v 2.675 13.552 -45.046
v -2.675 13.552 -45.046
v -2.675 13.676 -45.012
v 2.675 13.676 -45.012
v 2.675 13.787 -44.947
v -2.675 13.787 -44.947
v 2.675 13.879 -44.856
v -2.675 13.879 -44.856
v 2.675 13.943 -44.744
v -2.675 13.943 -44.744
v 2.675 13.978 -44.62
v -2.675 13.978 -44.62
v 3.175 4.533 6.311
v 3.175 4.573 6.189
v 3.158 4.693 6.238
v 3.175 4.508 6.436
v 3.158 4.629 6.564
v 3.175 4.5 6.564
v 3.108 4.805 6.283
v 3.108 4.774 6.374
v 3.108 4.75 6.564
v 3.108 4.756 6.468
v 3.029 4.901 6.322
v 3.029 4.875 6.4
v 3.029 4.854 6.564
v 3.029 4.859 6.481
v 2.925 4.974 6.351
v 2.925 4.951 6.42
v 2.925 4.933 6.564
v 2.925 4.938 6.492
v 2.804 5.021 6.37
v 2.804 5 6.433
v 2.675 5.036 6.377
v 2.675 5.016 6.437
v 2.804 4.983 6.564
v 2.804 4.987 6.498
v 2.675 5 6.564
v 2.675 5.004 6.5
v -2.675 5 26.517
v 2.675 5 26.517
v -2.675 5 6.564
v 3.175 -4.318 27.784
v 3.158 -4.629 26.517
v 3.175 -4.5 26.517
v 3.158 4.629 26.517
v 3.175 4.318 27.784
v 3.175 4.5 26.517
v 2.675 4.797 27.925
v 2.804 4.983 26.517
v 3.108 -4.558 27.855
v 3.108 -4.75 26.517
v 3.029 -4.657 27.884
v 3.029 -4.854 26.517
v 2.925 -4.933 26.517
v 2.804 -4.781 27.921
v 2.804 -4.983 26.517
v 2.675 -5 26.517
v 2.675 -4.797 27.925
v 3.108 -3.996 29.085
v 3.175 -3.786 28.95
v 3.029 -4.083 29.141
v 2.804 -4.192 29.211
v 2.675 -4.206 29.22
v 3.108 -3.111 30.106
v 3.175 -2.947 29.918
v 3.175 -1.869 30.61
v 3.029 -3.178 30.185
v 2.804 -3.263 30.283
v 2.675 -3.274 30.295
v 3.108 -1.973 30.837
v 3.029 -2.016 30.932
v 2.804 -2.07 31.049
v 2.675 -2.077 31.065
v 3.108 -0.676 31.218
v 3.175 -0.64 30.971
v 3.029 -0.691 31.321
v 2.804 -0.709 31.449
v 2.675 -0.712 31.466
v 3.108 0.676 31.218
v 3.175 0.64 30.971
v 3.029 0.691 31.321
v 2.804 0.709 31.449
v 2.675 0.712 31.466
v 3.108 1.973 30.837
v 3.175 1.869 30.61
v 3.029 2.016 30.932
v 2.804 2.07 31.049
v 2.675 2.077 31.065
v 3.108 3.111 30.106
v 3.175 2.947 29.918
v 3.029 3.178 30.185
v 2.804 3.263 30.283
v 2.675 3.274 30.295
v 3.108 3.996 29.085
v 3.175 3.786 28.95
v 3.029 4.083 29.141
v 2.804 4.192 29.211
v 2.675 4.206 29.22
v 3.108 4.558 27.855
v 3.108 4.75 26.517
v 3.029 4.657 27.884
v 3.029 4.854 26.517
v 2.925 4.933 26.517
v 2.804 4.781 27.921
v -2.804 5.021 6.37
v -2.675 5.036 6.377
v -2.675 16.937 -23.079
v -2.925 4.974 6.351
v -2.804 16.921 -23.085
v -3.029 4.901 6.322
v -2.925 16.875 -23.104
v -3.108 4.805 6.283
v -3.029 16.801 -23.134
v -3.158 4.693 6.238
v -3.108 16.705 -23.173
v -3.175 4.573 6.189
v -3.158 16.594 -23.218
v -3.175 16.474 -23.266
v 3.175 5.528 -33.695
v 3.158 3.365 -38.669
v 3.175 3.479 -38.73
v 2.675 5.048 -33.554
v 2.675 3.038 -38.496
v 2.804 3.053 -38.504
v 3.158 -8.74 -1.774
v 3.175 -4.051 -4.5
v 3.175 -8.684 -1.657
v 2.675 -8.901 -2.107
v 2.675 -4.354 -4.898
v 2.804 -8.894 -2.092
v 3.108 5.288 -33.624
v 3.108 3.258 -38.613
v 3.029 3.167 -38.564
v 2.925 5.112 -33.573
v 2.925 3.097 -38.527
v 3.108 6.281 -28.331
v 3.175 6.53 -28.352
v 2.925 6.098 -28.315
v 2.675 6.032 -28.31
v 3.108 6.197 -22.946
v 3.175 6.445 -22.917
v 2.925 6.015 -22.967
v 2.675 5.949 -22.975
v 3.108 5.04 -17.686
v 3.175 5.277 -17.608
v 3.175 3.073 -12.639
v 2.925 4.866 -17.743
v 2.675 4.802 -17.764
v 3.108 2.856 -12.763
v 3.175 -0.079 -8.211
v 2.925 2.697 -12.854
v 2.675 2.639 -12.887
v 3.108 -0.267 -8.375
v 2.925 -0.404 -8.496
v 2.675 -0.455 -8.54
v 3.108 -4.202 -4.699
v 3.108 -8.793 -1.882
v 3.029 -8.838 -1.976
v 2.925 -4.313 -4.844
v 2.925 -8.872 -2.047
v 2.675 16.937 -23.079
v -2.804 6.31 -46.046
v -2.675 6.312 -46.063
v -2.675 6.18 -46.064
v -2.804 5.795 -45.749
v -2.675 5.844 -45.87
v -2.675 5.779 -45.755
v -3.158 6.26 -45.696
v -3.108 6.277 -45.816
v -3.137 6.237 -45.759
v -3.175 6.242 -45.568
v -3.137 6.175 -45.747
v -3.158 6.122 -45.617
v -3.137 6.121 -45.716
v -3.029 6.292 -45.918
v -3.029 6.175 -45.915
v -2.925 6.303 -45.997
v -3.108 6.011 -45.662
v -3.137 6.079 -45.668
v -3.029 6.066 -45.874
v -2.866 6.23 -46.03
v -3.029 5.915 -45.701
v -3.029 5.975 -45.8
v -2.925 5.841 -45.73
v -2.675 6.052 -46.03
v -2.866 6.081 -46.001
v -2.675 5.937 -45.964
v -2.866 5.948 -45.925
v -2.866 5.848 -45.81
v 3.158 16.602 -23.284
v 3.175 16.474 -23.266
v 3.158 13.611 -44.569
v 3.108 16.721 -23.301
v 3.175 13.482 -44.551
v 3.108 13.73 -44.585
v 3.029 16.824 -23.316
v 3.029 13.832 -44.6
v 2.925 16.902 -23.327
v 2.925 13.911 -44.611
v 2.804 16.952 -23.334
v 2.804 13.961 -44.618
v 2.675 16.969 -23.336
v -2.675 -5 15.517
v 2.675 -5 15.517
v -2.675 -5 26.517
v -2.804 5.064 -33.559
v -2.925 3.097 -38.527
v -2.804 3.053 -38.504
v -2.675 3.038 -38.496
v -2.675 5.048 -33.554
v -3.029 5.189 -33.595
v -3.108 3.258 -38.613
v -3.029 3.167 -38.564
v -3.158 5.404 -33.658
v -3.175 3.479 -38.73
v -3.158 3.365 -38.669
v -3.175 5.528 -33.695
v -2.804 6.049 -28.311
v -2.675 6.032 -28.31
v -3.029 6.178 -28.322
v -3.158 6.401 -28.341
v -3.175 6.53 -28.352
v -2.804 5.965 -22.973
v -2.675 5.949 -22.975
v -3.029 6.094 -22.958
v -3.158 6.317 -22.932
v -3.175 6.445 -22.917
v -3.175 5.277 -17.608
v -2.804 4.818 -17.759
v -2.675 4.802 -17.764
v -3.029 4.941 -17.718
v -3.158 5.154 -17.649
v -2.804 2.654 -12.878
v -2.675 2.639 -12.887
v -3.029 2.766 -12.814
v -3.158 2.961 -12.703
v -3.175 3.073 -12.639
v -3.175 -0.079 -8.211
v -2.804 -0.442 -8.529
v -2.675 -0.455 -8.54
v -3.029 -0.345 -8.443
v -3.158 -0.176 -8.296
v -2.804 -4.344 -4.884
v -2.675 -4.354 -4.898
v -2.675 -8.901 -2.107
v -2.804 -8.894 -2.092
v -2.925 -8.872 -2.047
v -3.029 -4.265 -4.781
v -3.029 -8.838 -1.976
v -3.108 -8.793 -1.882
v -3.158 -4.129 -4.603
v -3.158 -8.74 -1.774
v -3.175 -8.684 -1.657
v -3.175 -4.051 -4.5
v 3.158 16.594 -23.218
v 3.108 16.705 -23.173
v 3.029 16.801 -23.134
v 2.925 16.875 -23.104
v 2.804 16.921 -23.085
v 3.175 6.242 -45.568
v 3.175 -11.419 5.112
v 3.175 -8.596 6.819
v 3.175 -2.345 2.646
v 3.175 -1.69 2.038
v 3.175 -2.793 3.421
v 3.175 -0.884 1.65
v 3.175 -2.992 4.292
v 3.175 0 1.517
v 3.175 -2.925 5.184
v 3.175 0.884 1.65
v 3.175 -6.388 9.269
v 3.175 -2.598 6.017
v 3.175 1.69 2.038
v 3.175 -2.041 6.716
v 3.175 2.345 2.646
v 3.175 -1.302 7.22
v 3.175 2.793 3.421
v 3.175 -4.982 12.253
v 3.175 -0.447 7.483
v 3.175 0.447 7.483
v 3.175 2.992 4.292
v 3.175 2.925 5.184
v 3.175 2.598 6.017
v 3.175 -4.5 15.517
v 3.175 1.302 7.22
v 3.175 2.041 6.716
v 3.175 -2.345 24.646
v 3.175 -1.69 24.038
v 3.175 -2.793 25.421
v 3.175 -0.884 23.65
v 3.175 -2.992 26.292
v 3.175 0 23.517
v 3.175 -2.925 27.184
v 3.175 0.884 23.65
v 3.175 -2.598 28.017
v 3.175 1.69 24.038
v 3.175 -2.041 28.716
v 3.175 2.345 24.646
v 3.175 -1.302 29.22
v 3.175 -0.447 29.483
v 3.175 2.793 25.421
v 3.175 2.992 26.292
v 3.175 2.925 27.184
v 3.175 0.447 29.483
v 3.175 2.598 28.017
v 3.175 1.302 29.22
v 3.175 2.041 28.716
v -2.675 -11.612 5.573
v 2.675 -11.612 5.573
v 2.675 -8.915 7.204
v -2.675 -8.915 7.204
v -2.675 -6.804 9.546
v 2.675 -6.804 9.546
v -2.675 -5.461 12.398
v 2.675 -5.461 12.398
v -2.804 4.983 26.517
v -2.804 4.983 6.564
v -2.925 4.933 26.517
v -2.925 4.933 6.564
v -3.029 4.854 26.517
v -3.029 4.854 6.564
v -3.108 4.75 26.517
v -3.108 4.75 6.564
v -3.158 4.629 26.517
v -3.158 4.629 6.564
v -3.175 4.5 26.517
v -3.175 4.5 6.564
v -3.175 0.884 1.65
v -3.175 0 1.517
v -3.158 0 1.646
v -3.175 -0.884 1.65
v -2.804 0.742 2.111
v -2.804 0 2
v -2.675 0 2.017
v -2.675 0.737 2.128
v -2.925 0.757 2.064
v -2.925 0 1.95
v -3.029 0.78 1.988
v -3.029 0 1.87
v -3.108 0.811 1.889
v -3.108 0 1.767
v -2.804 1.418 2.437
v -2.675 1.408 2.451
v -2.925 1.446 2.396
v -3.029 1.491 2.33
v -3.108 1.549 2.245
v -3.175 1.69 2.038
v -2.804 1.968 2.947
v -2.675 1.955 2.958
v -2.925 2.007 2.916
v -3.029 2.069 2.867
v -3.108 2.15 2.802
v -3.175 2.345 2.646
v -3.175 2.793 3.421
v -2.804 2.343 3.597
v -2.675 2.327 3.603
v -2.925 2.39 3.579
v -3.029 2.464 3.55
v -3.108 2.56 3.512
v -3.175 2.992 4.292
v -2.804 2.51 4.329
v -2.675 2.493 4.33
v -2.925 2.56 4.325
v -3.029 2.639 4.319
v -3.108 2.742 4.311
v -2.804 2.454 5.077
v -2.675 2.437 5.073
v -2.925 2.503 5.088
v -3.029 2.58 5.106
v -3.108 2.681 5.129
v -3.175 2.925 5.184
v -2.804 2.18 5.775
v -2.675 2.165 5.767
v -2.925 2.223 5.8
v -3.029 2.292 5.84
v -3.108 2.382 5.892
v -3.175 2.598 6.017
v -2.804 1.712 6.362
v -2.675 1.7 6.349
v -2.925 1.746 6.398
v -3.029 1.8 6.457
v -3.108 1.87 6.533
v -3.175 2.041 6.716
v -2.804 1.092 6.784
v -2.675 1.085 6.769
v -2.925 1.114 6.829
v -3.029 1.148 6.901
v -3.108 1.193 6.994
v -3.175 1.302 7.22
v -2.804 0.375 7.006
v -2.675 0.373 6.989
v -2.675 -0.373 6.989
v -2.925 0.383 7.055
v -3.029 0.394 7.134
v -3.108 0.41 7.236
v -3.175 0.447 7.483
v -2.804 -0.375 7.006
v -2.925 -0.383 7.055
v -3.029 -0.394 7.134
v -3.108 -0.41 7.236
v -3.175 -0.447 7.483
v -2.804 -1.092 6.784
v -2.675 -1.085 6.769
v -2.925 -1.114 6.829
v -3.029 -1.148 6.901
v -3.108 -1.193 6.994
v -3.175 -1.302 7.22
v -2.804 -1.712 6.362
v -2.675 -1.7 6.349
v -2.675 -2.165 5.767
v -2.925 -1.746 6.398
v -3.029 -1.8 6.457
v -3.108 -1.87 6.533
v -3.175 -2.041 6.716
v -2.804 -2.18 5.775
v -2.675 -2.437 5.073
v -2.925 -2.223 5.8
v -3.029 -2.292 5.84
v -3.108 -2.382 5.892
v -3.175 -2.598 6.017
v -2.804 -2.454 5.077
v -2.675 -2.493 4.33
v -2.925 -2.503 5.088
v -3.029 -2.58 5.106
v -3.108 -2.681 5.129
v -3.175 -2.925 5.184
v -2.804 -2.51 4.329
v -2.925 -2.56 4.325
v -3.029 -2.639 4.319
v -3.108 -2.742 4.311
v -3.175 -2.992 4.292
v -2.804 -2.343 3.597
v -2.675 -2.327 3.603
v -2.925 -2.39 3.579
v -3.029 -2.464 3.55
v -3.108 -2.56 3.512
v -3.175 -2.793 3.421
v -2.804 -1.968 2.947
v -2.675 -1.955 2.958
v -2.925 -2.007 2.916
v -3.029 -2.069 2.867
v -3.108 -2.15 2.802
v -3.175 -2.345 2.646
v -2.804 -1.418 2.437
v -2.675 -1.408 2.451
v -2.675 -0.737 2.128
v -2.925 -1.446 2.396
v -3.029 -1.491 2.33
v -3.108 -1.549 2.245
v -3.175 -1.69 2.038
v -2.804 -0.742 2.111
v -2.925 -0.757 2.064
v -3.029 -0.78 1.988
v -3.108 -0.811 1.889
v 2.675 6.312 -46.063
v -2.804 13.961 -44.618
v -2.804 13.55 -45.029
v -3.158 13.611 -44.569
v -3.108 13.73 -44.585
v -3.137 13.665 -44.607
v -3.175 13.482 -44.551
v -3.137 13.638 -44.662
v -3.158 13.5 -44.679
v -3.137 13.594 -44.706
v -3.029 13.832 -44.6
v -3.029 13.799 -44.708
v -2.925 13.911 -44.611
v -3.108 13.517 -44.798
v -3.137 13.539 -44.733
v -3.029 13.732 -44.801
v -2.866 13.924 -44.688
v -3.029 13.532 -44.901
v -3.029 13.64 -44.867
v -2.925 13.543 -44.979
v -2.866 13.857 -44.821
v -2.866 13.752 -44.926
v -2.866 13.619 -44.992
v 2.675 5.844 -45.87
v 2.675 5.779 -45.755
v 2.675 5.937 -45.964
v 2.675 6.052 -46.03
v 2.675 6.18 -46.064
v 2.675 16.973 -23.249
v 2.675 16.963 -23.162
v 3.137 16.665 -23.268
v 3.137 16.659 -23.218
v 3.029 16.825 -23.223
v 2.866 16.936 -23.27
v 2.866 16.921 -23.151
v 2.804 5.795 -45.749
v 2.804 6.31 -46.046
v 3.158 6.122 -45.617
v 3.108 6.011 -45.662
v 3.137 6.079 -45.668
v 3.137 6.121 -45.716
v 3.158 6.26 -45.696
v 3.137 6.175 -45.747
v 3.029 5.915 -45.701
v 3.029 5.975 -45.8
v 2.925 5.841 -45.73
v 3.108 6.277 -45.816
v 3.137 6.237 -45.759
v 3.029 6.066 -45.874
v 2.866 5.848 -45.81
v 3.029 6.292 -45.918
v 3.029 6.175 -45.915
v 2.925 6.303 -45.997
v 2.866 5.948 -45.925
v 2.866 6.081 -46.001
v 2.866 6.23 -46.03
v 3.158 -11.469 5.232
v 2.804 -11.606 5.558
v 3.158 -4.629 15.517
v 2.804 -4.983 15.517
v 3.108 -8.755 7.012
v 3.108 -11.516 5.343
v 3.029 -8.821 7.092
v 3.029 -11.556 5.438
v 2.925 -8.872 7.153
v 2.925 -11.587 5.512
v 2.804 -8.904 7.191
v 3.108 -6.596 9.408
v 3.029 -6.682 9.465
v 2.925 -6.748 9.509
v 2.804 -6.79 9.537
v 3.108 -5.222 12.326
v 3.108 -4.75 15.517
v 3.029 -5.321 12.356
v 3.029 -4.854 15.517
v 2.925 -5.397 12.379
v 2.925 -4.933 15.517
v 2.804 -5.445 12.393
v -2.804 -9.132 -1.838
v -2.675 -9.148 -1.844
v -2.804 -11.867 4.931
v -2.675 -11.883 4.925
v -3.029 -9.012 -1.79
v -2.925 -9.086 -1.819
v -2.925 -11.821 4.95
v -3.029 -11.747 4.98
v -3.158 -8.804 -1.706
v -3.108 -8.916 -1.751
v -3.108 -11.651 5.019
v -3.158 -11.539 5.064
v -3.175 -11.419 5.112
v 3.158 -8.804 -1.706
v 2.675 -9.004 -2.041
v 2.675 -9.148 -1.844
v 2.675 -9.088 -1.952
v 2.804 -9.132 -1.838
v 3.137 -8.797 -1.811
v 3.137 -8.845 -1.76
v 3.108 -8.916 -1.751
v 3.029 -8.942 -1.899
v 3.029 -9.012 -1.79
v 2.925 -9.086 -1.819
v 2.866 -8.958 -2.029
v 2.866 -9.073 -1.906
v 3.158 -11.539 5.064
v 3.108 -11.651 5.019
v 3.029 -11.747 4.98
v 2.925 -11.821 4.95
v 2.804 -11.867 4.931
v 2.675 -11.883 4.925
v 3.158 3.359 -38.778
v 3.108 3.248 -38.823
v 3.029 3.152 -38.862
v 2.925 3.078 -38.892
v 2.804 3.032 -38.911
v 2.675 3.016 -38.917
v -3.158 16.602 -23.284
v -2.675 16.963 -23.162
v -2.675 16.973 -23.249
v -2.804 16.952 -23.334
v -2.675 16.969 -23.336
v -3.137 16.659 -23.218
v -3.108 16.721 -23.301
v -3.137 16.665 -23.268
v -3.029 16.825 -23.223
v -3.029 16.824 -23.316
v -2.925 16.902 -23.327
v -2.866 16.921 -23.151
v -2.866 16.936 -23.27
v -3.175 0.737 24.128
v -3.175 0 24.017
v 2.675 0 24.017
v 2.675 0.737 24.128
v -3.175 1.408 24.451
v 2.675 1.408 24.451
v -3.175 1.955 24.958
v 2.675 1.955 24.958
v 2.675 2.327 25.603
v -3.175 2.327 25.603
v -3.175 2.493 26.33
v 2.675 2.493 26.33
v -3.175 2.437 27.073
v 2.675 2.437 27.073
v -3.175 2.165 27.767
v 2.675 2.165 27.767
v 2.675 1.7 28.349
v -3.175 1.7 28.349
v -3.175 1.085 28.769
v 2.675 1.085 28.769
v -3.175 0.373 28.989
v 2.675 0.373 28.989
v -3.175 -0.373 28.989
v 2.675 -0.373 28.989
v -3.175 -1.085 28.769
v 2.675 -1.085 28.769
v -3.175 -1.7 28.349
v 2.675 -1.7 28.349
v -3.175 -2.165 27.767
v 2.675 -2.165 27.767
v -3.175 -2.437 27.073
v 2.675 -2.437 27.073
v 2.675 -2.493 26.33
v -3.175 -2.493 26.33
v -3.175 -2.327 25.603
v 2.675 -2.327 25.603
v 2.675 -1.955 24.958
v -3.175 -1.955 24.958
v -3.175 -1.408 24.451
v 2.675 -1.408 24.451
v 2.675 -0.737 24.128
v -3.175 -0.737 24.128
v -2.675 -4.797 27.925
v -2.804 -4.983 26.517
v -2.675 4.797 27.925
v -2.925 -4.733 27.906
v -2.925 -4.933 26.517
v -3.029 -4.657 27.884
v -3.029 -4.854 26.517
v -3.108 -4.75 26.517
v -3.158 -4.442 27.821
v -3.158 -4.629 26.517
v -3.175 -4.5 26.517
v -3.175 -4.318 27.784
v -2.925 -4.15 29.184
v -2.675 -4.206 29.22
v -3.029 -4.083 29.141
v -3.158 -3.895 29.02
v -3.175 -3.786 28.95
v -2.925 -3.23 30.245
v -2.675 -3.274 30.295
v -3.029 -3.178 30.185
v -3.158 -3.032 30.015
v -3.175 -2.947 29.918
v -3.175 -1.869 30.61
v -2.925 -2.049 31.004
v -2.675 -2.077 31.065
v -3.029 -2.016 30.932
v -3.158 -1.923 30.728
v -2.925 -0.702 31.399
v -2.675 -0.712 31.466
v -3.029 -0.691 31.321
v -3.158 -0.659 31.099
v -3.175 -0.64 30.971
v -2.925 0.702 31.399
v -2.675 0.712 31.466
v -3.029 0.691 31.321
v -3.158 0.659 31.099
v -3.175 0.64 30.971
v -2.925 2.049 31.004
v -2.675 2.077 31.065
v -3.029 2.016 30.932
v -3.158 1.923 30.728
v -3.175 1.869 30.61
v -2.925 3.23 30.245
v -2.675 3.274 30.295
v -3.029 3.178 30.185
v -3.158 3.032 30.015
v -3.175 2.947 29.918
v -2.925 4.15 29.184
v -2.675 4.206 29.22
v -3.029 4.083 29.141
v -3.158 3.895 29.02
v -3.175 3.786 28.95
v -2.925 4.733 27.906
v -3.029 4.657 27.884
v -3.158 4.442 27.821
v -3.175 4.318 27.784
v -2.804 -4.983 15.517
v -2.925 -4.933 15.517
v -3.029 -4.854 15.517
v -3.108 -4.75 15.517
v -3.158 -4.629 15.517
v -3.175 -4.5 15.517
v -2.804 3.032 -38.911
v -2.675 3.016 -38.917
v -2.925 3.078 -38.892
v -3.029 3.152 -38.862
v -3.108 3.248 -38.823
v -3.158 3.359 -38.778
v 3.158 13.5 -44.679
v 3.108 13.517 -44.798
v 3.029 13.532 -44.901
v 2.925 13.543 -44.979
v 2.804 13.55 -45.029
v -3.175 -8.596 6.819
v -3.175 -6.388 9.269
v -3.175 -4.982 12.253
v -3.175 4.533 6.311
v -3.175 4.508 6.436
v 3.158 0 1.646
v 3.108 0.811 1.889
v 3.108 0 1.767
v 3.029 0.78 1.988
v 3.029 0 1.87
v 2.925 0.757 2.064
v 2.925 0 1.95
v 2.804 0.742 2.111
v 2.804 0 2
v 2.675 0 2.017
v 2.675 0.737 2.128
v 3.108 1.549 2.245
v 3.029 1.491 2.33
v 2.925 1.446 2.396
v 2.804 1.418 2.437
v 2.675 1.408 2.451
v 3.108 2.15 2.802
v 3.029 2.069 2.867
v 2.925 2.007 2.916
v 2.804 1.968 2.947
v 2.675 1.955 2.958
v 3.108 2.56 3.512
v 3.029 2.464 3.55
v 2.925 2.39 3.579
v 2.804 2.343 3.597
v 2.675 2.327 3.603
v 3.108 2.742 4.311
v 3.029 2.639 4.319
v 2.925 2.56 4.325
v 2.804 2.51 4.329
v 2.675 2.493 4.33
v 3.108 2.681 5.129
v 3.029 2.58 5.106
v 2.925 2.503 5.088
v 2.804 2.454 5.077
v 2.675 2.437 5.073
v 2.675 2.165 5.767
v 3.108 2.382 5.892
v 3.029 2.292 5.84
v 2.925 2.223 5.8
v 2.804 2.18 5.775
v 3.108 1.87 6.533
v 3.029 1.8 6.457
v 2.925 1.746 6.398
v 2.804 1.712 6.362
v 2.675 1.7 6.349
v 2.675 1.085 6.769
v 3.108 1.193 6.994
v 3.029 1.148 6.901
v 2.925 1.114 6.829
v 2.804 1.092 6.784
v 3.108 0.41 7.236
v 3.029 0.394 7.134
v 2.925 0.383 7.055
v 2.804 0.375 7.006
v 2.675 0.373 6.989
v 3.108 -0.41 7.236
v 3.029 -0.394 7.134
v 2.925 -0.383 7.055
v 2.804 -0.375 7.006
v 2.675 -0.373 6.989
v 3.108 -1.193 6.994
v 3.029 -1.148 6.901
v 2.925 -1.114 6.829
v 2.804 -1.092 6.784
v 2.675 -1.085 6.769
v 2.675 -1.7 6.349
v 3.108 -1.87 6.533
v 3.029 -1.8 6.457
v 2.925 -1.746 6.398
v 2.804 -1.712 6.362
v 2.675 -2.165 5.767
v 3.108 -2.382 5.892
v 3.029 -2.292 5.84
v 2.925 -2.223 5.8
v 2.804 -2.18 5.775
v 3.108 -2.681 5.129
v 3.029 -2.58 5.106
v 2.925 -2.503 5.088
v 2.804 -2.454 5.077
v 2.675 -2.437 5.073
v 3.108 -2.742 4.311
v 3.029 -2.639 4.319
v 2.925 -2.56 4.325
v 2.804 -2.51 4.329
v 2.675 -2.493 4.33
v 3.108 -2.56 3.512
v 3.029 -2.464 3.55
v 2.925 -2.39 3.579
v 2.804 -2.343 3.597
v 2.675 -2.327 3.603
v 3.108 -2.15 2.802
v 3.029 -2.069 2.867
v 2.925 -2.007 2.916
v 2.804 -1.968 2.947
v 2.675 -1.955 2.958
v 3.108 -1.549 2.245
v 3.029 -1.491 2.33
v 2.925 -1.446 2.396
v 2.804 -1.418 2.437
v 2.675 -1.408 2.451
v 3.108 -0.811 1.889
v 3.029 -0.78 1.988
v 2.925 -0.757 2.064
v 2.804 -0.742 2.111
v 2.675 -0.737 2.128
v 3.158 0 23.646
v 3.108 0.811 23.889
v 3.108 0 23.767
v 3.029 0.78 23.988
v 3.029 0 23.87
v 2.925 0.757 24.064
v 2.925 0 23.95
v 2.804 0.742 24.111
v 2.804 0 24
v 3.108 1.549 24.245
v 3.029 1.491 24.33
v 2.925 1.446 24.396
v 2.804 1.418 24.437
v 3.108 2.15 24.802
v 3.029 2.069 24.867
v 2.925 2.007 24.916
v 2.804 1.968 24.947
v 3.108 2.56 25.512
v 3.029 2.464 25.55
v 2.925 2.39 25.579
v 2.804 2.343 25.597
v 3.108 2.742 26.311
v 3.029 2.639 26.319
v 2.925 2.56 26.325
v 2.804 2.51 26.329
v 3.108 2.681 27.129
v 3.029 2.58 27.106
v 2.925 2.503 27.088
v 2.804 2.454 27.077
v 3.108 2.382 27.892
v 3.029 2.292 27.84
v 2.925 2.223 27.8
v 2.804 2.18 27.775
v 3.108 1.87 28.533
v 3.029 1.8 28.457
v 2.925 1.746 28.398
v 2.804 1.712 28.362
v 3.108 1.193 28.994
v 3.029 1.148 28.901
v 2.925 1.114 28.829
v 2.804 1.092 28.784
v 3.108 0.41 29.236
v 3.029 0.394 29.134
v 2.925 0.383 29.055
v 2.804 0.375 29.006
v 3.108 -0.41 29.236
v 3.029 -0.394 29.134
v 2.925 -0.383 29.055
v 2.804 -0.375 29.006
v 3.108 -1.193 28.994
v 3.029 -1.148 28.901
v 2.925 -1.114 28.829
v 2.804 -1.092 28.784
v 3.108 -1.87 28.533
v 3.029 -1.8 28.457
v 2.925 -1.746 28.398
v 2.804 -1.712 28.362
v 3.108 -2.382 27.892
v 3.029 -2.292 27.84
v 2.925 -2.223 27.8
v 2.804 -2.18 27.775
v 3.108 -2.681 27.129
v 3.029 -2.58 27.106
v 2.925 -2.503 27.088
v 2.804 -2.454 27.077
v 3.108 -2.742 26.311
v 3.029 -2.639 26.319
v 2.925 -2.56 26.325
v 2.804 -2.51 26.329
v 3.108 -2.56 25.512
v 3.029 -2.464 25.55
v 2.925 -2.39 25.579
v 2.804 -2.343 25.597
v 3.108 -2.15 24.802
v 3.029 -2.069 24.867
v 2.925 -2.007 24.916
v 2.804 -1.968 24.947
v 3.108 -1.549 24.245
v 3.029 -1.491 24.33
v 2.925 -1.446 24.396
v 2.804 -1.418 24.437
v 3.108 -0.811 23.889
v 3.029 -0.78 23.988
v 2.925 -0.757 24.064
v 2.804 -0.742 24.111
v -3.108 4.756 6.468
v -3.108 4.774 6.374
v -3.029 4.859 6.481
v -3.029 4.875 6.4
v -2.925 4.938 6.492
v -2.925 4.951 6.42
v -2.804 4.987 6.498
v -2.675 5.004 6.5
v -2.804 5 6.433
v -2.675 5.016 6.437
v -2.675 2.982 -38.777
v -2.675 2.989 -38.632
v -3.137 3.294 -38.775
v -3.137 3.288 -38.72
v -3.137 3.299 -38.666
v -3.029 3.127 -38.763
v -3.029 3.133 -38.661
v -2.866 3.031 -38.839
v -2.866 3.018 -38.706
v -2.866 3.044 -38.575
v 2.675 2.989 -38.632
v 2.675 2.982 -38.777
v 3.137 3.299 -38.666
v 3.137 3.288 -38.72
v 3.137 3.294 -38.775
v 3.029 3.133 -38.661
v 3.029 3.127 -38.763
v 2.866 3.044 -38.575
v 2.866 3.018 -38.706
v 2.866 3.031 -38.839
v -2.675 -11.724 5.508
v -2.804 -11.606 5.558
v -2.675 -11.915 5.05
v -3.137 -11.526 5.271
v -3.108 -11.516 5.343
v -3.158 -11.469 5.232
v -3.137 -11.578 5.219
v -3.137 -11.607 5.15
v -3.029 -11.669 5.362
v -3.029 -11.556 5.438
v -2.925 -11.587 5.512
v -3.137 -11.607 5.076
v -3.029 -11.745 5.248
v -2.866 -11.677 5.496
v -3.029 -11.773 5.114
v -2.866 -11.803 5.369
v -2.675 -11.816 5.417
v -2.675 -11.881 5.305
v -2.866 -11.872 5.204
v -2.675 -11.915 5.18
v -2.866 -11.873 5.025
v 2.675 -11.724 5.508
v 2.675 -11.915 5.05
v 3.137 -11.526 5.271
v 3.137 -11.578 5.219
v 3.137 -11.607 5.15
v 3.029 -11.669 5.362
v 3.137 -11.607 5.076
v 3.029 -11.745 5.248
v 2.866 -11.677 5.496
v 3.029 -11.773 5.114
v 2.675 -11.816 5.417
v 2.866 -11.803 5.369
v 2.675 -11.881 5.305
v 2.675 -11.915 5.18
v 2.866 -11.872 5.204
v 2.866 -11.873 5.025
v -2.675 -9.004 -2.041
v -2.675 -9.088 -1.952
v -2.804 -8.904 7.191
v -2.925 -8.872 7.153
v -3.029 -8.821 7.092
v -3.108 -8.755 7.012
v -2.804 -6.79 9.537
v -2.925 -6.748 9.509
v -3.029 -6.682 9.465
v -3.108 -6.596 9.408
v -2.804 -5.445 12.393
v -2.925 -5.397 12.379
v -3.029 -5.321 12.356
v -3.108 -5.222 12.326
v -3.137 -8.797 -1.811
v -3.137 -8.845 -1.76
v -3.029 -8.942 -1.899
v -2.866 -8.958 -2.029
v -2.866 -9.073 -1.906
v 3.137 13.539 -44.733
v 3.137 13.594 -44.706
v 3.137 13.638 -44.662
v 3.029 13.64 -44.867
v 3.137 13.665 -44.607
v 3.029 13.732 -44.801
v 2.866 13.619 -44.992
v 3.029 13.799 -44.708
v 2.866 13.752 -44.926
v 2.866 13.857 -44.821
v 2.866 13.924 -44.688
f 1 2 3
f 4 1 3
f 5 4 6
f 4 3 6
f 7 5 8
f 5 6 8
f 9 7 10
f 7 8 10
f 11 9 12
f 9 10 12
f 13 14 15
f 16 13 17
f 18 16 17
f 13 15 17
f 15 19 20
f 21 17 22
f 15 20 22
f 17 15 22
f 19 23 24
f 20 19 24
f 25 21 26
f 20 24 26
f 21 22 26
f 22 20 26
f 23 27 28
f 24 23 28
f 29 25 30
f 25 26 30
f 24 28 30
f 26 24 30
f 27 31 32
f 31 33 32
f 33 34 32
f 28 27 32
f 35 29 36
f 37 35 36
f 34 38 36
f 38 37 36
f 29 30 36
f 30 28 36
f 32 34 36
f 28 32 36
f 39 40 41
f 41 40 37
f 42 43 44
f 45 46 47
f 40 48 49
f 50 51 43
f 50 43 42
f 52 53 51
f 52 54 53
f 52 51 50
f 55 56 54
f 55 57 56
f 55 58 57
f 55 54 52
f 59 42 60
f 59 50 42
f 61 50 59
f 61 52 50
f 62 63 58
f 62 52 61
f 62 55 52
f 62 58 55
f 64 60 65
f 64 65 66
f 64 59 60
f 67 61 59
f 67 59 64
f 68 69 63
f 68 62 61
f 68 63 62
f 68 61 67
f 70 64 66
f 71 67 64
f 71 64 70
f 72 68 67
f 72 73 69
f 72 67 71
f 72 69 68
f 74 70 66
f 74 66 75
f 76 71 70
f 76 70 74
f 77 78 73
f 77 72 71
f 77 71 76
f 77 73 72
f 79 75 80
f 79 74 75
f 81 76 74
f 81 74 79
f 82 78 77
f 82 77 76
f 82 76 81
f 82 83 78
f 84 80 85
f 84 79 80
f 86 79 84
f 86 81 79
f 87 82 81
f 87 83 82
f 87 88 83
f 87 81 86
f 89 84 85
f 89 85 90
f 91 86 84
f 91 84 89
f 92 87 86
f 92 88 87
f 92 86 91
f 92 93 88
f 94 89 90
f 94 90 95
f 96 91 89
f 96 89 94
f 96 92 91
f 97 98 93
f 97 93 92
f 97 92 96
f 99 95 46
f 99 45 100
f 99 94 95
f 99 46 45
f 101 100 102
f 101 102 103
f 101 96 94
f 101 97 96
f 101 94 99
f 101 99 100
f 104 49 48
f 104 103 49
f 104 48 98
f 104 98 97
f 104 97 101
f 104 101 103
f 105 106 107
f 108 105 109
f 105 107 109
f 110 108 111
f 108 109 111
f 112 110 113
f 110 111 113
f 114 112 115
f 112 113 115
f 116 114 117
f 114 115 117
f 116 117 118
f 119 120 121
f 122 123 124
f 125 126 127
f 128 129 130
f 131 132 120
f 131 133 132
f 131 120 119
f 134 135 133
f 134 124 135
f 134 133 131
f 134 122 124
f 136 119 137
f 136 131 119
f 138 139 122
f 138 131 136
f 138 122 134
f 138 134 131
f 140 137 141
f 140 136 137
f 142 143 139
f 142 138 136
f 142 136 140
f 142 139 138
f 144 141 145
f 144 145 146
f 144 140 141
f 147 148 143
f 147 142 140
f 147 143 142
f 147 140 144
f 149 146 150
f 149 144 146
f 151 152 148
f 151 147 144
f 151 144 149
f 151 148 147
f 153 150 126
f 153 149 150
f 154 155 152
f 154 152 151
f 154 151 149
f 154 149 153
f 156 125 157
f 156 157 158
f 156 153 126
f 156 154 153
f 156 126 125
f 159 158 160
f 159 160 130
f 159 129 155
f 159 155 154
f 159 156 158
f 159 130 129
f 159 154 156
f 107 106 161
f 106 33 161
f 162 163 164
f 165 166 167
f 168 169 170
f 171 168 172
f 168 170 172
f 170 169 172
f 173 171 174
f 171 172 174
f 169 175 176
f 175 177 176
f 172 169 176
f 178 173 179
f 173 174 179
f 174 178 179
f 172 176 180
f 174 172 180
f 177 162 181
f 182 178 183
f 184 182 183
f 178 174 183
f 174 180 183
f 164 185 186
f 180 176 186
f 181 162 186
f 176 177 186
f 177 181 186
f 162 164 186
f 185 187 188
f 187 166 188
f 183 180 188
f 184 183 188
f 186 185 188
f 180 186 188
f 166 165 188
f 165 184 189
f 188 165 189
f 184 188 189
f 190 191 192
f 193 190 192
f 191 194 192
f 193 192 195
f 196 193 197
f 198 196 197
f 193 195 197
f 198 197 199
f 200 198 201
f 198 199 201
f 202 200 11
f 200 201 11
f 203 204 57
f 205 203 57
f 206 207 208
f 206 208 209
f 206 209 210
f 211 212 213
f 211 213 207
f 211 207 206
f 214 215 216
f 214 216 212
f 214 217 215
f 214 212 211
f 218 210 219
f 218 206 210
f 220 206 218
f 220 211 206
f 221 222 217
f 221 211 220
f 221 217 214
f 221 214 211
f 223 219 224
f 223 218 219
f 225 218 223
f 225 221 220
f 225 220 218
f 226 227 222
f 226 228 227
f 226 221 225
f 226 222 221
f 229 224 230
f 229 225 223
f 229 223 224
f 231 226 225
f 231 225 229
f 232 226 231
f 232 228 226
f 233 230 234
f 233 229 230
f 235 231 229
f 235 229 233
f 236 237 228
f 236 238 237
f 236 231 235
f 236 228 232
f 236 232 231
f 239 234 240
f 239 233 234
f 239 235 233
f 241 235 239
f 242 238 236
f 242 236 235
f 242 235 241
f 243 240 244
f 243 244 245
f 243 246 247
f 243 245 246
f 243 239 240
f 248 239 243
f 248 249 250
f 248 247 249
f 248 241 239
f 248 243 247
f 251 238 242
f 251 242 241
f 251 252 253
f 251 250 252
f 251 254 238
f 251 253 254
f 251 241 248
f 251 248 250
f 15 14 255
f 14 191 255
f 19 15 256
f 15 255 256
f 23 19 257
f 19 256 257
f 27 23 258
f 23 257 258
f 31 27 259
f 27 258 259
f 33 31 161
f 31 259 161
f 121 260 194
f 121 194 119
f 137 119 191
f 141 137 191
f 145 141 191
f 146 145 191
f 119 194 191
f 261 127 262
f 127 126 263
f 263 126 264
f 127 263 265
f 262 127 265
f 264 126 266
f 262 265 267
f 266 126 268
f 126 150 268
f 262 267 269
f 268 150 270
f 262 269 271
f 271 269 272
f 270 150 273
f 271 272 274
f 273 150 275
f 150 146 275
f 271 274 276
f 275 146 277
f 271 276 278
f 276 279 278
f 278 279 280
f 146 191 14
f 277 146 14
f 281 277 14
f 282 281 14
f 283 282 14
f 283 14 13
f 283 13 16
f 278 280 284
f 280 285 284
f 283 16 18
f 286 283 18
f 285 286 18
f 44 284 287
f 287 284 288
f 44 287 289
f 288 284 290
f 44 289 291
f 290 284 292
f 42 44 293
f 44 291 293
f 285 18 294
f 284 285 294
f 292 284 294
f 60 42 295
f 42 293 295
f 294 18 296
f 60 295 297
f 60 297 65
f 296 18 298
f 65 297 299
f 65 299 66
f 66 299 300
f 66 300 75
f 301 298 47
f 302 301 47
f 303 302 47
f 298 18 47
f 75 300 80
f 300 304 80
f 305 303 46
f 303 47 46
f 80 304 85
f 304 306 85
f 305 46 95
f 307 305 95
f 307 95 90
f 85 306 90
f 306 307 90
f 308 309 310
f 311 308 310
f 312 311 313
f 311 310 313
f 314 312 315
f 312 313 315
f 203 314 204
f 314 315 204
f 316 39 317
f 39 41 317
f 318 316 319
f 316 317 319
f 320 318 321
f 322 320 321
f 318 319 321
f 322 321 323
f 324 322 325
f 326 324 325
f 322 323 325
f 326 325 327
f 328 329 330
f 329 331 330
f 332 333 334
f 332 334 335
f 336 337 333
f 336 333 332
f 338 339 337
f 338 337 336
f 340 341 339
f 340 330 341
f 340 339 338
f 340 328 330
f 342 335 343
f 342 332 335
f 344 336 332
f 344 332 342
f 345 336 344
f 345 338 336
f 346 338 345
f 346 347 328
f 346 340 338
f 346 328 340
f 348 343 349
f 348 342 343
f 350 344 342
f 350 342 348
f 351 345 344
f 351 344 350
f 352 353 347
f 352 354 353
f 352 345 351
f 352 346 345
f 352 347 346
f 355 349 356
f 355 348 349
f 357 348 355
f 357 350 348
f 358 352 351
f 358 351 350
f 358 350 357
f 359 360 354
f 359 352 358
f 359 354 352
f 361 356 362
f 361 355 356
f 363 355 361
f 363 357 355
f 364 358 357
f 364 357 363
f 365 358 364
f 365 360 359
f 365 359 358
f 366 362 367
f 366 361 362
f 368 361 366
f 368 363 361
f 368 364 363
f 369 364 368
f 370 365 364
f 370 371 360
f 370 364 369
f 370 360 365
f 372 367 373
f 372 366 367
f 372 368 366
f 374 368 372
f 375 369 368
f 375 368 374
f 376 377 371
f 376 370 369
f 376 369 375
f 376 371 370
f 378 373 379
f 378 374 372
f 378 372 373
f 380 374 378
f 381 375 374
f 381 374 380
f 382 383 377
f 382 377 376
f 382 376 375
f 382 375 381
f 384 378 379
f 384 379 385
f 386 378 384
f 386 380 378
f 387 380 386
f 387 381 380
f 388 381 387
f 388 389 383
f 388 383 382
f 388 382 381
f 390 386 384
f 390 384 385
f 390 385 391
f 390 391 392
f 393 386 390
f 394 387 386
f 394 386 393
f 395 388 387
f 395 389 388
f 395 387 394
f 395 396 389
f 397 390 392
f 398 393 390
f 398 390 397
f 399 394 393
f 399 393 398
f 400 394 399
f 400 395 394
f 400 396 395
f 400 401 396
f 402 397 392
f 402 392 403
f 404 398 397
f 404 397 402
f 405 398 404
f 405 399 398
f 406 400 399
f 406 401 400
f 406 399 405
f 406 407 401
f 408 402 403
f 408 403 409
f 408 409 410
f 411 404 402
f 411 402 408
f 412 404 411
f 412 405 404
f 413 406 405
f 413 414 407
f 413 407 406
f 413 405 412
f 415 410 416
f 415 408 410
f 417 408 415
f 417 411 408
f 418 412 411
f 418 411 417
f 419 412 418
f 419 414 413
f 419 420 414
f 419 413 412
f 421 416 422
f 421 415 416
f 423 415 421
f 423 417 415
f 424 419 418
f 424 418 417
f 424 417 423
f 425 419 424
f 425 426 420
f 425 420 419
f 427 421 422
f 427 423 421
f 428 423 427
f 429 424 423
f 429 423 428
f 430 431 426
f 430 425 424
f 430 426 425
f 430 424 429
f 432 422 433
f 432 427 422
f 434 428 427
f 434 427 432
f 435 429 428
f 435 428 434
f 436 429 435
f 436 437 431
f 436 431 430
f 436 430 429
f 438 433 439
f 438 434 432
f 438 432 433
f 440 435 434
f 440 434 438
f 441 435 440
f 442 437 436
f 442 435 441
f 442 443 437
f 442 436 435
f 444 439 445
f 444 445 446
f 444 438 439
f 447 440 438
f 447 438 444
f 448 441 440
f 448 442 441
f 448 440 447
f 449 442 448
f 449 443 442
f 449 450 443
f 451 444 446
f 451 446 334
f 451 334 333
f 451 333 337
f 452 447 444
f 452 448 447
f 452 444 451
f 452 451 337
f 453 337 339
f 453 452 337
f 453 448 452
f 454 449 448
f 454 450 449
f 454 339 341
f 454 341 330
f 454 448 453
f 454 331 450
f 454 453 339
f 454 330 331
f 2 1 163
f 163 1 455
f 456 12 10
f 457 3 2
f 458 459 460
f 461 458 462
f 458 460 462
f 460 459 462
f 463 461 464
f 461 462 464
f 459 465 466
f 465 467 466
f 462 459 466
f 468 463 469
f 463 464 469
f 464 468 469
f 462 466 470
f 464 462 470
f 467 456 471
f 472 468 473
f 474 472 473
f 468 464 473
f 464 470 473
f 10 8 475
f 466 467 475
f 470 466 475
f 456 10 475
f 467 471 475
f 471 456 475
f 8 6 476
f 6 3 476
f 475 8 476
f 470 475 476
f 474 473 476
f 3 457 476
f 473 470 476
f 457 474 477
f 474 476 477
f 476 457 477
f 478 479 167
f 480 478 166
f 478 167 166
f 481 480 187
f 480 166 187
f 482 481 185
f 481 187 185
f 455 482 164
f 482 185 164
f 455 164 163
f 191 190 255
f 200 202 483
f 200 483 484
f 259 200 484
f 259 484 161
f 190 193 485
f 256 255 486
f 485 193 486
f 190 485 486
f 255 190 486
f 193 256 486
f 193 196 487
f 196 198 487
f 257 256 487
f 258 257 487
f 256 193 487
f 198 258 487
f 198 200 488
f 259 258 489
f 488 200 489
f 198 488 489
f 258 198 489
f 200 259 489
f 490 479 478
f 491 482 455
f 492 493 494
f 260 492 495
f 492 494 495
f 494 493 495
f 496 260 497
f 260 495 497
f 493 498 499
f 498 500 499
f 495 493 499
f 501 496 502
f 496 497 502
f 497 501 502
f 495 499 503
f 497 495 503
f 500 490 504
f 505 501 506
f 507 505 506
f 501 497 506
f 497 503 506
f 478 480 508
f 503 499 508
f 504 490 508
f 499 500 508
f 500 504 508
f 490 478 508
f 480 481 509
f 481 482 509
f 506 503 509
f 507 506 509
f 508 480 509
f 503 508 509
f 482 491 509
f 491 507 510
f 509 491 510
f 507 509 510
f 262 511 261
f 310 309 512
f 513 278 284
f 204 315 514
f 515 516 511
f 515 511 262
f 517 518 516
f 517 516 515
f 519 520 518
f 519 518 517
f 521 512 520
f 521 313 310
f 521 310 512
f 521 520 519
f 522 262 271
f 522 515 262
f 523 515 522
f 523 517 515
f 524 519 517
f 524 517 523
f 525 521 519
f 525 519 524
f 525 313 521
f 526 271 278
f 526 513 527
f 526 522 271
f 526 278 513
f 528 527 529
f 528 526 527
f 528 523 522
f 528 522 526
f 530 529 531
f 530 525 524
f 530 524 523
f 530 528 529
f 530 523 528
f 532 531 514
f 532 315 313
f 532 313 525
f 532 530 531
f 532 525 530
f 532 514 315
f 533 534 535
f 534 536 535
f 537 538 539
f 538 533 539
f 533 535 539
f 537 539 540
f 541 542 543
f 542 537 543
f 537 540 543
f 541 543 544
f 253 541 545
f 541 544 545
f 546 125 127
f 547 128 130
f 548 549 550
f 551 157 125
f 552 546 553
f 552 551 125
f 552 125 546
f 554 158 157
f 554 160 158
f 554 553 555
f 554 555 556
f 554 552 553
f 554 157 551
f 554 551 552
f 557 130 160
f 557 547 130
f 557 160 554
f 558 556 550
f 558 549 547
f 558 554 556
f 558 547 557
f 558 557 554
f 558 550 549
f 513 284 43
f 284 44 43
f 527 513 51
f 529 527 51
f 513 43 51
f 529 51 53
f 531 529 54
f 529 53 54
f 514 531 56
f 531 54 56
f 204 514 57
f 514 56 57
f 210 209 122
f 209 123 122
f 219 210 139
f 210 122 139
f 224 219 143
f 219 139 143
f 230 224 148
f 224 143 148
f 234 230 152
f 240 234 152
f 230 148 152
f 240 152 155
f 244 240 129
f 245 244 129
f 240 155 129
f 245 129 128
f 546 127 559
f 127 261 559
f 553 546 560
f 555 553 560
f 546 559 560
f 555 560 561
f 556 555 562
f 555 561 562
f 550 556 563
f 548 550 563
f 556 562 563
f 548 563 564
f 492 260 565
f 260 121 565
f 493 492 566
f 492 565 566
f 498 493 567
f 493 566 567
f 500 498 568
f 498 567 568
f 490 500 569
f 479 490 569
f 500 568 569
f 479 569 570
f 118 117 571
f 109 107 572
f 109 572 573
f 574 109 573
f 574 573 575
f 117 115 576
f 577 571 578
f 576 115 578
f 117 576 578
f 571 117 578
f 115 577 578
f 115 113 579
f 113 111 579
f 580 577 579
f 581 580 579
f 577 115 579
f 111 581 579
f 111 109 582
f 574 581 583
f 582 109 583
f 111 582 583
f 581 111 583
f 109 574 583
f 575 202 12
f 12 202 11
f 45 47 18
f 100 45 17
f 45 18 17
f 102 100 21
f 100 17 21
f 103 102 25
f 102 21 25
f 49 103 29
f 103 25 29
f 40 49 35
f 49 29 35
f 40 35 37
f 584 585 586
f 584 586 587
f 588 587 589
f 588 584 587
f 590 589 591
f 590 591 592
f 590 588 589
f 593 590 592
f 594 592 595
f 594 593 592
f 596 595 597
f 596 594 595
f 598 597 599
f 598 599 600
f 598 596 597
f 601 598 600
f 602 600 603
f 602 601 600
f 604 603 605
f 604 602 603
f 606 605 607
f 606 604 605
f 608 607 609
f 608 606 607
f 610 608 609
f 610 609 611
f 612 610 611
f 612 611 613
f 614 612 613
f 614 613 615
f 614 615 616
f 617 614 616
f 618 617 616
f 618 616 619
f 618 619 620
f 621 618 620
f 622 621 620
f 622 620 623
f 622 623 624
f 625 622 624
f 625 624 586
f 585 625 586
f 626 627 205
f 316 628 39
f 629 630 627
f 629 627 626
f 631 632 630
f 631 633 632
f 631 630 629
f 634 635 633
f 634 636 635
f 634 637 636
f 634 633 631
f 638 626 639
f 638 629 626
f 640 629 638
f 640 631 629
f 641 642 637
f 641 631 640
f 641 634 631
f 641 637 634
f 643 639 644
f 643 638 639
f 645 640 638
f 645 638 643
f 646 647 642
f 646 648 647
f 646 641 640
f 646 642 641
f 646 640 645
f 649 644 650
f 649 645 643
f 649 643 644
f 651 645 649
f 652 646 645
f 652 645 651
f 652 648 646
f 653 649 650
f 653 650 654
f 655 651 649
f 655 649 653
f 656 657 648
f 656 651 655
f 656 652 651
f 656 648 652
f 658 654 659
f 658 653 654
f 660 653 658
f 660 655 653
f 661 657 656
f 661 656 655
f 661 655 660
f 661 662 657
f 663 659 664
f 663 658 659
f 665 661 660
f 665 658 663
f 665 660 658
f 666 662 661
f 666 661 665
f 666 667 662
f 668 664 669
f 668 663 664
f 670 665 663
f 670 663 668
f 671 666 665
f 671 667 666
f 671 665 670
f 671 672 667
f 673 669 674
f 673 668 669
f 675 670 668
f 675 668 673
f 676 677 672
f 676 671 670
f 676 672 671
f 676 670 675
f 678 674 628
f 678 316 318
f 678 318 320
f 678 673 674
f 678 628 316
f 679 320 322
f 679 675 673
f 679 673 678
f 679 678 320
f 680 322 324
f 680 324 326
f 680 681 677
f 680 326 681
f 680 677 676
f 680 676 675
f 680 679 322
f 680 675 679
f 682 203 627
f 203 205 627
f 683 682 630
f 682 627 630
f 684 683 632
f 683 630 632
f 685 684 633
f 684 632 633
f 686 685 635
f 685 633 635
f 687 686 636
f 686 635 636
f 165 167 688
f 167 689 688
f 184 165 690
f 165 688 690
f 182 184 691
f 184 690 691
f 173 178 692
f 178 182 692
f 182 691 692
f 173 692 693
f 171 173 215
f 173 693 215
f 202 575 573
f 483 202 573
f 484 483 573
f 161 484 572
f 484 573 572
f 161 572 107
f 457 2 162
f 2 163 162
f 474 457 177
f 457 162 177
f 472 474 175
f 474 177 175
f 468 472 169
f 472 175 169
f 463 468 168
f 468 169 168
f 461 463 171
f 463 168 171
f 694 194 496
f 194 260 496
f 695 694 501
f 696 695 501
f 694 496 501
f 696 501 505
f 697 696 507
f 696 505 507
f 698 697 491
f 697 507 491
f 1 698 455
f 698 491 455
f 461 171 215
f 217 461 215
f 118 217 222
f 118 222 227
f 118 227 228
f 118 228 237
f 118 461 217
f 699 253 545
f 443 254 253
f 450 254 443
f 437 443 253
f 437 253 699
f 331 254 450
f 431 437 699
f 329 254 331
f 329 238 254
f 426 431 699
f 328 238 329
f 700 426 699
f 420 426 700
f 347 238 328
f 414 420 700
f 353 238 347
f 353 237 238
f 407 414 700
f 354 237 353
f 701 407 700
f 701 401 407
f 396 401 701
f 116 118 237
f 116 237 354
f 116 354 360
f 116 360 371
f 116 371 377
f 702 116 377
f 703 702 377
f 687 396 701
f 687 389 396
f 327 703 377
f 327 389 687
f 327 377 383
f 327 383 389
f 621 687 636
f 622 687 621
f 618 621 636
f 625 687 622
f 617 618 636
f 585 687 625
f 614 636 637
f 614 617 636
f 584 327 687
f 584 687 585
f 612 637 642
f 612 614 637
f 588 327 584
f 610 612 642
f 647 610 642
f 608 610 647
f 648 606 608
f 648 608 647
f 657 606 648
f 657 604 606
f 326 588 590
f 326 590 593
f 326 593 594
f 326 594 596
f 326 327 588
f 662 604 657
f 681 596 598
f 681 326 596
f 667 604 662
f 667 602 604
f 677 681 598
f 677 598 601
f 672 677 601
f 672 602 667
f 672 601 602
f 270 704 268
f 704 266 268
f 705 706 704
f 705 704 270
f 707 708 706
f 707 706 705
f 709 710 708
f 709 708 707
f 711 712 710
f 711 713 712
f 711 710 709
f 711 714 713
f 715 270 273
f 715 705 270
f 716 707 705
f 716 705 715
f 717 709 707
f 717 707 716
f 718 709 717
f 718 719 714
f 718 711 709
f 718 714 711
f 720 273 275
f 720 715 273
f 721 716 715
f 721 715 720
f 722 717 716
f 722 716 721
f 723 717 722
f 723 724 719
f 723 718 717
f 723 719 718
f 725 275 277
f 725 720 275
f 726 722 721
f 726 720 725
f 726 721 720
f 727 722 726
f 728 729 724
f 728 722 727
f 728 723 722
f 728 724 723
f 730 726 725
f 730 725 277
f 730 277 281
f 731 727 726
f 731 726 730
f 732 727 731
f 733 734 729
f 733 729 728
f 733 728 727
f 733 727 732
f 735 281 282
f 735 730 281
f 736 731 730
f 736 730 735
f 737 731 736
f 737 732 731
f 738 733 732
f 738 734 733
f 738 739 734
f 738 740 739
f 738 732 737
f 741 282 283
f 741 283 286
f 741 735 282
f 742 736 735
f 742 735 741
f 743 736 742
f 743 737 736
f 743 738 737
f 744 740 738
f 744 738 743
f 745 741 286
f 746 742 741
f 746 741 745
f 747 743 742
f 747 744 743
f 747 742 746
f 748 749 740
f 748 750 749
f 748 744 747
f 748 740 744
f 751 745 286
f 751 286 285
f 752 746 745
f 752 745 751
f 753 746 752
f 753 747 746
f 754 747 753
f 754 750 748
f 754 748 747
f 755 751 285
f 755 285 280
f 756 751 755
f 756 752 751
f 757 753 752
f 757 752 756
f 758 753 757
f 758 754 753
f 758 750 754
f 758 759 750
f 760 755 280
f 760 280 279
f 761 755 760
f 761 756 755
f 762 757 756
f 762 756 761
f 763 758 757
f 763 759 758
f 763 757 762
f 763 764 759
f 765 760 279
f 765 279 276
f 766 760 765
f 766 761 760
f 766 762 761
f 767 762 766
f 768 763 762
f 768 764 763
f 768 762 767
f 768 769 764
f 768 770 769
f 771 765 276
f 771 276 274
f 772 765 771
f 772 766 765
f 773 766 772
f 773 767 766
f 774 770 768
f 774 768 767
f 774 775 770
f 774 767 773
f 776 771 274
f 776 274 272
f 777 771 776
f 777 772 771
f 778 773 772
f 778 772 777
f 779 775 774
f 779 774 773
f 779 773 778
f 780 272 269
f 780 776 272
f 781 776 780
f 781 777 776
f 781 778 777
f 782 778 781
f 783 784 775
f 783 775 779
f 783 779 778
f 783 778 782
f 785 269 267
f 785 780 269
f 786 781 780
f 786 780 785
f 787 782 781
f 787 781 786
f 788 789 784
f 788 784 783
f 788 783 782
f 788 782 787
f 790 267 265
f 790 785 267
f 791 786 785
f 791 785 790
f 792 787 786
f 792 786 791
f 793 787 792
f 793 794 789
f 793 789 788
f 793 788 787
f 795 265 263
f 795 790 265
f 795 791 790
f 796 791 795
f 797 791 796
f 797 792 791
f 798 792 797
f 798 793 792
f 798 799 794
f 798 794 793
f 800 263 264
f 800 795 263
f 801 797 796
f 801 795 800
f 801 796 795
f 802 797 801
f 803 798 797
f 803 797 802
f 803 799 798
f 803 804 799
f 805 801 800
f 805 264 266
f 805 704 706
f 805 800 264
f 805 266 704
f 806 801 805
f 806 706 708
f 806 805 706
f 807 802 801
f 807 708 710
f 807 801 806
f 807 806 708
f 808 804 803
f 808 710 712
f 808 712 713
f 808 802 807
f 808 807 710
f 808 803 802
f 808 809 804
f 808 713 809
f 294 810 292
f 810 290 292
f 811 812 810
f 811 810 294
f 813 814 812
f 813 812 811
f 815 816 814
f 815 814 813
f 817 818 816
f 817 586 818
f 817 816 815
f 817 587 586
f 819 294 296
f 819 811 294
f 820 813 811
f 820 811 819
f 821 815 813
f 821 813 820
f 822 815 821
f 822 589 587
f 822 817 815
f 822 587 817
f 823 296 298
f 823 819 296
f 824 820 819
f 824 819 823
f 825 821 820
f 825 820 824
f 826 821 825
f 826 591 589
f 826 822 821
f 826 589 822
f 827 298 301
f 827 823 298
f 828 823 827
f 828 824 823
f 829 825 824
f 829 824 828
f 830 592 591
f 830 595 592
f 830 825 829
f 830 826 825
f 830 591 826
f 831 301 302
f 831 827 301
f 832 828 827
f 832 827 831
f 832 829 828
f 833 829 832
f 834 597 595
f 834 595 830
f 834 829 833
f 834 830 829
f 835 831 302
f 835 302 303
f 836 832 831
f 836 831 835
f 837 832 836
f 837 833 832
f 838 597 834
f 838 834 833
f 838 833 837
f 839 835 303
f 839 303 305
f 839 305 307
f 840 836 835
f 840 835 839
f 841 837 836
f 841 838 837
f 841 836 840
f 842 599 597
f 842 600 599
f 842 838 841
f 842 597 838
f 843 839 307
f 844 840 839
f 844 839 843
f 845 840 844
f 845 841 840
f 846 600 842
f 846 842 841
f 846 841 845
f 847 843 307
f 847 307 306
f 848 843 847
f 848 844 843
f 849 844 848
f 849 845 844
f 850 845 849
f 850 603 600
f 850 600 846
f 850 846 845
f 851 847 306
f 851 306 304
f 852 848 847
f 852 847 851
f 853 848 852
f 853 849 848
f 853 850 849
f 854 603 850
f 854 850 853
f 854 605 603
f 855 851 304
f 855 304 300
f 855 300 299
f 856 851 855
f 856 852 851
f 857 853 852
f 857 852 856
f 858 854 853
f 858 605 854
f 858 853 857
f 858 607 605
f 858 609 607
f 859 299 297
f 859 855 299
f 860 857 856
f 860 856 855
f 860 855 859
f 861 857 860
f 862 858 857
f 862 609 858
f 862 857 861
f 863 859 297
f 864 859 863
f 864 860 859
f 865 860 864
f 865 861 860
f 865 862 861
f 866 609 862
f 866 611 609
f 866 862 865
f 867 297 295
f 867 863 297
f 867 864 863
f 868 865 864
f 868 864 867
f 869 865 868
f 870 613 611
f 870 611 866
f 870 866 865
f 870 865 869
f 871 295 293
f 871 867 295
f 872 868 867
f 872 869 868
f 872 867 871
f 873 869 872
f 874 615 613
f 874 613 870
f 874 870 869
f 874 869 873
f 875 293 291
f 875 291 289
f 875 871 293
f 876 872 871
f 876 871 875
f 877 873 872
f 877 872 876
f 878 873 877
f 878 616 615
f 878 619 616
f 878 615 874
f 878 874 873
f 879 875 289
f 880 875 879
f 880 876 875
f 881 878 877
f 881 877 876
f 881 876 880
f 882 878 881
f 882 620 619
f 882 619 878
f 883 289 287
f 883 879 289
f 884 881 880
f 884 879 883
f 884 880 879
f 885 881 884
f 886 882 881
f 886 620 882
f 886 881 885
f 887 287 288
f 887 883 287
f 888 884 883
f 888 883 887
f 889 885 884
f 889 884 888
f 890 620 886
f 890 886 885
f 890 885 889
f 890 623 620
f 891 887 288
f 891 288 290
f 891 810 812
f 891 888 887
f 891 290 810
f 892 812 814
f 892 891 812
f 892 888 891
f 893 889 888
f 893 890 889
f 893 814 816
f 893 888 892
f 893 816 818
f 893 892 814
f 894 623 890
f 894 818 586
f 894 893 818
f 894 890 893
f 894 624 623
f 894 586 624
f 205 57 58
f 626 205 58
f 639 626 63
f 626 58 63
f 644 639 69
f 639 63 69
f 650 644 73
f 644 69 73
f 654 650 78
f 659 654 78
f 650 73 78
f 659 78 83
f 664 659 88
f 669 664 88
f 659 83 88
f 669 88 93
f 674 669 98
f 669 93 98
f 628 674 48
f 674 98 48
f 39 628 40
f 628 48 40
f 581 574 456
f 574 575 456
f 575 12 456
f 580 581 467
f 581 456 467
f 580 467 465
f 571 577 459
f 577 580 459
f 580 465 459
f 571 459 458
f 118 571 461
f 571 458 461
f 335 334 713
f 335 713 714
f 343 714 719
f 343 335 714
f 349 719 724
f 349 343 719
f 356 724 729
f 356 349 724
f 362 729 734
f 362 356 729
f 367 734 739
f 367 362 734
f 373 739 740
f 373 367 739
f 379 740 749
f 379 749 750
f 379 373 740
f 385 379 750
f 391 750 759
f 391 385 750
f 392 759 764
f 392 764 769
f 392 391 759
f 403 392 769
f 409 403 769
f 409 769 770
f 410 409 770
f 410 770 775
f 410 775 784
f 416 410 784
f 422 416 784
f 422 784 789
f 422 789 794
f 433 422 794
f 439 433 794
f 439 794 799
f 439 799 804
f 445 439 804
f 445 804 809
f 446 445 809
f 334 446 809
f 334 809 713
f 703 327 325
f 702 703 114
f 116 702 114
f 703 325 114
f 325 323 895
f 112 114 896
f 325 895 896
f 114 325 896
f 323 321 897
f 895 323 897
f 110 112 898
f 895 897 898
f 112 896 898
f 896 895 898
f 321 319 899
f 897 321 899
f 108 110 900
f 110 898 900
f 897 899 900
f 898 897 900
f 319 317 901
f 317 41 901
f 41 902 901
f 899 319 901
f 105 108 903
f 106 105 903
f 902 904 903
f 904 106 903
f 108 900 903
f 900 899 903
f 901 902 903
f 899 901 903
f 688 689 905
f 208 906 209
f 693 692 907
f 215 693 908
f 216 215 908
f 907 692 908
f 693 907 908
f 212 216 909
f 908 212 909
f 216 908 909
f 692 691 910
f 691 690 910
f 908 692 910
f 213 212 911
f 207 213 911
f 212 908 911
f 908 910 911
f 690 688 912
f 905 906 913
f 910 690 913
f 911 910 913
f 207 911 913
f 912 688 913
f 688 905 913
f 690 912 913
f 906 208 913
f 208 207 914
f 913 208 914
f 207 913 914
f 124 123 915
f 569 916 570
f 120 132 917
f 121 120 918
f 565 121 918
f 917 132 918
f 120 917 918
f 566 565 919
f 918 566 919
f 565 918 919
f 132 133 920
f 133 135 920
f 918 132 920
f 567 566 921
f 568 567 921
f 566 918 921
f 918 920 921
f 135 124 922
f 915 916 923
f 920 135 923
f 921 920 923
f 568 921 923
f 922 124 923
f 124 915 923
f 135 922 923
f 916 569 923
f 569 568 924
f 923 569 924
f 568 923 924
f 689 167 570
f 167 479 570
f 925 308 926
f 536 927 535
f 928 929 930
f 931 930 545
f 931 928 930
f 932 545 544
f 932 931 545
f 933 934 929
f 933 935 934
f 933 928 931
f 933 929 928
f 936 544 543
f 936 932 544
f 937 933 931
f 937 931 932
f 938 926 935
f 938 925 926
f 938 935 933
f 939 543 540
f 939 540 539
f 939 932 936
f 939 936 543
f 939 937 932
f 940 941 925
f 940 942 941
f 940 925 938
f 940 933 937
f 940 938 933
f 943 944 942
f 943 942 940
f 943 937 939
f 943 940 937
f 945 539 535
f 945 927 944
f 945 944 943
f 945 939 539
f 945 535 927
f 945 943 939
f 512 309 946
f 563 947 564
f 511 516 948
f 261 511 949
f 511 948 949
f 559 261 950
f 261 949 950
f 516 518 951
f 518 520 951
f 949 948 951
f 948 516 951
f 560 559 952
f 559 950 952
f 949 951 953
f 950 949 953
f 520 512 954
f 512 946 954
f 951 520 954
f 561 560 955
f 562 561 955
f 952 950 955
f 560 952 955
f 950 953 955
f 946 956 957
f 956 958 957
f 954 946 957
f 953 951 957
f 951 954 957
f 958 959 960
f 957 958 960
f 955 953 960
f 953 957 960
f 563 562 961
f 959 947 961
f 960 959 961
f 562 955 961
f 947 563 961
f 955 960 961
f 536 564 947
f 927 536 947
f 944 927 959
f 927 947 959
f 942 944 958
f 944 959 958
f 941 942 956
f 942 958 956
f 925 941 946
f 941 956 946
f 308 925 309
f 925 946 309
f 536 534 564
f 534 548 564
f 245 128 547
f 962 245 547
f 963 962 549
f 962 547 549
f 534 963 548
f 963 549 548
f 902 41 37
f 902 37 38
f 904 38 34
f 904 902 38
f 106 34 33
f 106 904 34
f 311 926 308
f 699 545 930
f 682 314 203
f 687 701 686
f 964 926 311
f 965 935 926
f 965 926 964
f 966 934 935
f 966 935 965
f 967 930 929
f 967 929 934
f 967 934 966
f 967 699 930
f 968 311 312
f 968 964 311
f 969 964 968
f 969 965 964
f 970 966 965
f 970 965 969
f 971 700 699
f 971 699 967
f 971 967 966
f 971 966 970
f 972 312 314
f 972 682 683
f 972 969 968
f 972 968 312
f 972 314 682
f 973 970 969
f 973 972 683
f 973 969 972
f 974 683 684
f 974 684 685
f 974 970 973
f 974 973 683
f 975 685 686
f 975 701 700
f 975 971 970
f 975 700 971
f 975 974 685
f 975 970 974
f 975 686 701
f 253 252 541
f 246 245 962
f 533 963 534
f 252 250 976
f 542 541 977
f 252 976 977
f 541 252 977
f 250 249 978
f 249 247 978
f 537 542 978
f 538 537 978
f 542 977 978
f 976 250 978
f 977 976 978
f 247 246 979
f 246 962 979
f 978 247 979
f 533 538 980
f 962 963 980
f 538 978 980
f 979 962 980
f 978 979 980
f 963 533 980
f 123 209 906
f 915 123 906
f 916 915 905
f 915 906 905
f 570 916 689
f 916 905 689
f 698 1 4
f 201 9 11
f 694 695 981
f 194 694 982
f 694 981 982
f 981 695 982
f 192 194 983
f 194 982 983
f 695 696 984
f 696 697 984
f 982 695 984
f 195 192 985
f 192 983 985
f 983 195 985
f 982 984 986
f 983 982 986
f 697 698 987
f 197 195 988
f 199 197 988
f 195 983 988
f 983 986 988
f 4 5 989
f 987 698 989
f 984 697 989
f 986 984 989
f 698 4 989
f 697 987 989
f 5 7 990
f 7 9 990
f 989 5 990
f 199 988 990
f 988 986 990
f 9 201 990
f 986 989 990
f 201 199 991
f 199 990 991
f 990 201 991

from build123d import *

# Parameters (mm, degrees)
ESBO_O2_R                = 2.5
RESSALTO_EXTRUS_O1_DEPTH = 3.175
FILETE1_R                = 0.5


with BuildPart() as part:
    # Esboço2 → Ressalto-extrusão1 (new, symmetric)
    with BuildSketch(Plane(origin=(0, 0, 0), x_dir=(0, 0, -1), z_dir=(1, 0, 0))):
        with BuildLine():
            Line((-26.516682084, 5), (-6.466682084, 5))
            Line((-6.466682084, 5), (23.203317916, 16.987458121))
            Line((23.203317916, 16.987458121), (44.993317916, 13.925073332))
            Line((44.993317916, 13.925073332), (46.117644593, 5.925073332))
            Line((46.117644593, 5.925073332), (38.700173757, 2.928220585))
            ThreePointArc((38.700173757, 2.928220585), (17.782793868, 4.808335878), (2.024389796, -9.074902795))
            Line((2.024389796, -9.074902795), (-5.39308104, -12.071755542))
            ThreePointArc((-5.39308104, -12.071755542), (-9.342197803, -6.94301071), (-15.516682084, -5))
            Line((-15.516682084, -5), (-26.516682084, -5))
            ThreePointArc((-26.516682084, -5), (-31.516682084, 0), (-26.516682084, 5))
        make_face()
        with Locations((-26.516682084, 0)):
            Circle(ESBO_O2_R, mode=Mode.SUBTRACT)
        with Locations((-4.516682084, 0)):
            Circle(ESBO_O2_R, mode=Mode.SUBTRACT)
    extrude(amount=RESSALTO_EXTRUS_O1_DEPTH, both=True)

    # Filete1
    filete1_edges = [part.edges().sort_by_distance(p)[0] for p in [
        (-3.175, 5, 16.491682084),
        (-3.175, 10.99372906, -8.368317916),
        (-3.175, 15.456265726, -34.098317916),
        (-3.175, 9.925073332, -45.555481255),
        (-3.175, 4.426646959, -42.408909175),
        (-3.175, 4.808335878, -17.782793868),
        (-3.175, -10.573329168, 1.684345622),
        (3.175, -6.94301071, 9.342197803),
        (-3.175, -6.94301071, 9.342197803),
        (-3.175, -5, 21.016682084),
        (-3.175, 0, 31.516682084),
        (3.175, -10.573329168, 1.684345622),
        (0, 5, 6.466682084),
        (0, 16.987458121, -23.203317916),
        (0, 13.925073332, -44.993317916),
        (0, 5.925073332, -46.117644593),
        (0, 2.928220585, -38.700173757),
        (0, -9.074902795, -2.024389796),
        (0, -12.071755542, 5.39308104),
        (3.175, 4.808335878, -17.782793868),
        (3.175, 4.426646959, -42.408909175),
        (3.175, 0, 29.016682084),
        (3.175, 9.925073332, -45.555481255),
        (-3.175, 0, 7.016682084),
        (3.175, 0, 7.016682084),
        (3.175, 15.456265726, -34.098317916),
        (3.175, 10.99372906, -8.368317916),
        (3.175, 5, 16.491682084),
        (3.175, 0, 31.516682084),
        (3.175, -5, 21.016682084),
    ]]
    fillet(filete1_edges, radius=FILETE1_R)


solid = part.part
